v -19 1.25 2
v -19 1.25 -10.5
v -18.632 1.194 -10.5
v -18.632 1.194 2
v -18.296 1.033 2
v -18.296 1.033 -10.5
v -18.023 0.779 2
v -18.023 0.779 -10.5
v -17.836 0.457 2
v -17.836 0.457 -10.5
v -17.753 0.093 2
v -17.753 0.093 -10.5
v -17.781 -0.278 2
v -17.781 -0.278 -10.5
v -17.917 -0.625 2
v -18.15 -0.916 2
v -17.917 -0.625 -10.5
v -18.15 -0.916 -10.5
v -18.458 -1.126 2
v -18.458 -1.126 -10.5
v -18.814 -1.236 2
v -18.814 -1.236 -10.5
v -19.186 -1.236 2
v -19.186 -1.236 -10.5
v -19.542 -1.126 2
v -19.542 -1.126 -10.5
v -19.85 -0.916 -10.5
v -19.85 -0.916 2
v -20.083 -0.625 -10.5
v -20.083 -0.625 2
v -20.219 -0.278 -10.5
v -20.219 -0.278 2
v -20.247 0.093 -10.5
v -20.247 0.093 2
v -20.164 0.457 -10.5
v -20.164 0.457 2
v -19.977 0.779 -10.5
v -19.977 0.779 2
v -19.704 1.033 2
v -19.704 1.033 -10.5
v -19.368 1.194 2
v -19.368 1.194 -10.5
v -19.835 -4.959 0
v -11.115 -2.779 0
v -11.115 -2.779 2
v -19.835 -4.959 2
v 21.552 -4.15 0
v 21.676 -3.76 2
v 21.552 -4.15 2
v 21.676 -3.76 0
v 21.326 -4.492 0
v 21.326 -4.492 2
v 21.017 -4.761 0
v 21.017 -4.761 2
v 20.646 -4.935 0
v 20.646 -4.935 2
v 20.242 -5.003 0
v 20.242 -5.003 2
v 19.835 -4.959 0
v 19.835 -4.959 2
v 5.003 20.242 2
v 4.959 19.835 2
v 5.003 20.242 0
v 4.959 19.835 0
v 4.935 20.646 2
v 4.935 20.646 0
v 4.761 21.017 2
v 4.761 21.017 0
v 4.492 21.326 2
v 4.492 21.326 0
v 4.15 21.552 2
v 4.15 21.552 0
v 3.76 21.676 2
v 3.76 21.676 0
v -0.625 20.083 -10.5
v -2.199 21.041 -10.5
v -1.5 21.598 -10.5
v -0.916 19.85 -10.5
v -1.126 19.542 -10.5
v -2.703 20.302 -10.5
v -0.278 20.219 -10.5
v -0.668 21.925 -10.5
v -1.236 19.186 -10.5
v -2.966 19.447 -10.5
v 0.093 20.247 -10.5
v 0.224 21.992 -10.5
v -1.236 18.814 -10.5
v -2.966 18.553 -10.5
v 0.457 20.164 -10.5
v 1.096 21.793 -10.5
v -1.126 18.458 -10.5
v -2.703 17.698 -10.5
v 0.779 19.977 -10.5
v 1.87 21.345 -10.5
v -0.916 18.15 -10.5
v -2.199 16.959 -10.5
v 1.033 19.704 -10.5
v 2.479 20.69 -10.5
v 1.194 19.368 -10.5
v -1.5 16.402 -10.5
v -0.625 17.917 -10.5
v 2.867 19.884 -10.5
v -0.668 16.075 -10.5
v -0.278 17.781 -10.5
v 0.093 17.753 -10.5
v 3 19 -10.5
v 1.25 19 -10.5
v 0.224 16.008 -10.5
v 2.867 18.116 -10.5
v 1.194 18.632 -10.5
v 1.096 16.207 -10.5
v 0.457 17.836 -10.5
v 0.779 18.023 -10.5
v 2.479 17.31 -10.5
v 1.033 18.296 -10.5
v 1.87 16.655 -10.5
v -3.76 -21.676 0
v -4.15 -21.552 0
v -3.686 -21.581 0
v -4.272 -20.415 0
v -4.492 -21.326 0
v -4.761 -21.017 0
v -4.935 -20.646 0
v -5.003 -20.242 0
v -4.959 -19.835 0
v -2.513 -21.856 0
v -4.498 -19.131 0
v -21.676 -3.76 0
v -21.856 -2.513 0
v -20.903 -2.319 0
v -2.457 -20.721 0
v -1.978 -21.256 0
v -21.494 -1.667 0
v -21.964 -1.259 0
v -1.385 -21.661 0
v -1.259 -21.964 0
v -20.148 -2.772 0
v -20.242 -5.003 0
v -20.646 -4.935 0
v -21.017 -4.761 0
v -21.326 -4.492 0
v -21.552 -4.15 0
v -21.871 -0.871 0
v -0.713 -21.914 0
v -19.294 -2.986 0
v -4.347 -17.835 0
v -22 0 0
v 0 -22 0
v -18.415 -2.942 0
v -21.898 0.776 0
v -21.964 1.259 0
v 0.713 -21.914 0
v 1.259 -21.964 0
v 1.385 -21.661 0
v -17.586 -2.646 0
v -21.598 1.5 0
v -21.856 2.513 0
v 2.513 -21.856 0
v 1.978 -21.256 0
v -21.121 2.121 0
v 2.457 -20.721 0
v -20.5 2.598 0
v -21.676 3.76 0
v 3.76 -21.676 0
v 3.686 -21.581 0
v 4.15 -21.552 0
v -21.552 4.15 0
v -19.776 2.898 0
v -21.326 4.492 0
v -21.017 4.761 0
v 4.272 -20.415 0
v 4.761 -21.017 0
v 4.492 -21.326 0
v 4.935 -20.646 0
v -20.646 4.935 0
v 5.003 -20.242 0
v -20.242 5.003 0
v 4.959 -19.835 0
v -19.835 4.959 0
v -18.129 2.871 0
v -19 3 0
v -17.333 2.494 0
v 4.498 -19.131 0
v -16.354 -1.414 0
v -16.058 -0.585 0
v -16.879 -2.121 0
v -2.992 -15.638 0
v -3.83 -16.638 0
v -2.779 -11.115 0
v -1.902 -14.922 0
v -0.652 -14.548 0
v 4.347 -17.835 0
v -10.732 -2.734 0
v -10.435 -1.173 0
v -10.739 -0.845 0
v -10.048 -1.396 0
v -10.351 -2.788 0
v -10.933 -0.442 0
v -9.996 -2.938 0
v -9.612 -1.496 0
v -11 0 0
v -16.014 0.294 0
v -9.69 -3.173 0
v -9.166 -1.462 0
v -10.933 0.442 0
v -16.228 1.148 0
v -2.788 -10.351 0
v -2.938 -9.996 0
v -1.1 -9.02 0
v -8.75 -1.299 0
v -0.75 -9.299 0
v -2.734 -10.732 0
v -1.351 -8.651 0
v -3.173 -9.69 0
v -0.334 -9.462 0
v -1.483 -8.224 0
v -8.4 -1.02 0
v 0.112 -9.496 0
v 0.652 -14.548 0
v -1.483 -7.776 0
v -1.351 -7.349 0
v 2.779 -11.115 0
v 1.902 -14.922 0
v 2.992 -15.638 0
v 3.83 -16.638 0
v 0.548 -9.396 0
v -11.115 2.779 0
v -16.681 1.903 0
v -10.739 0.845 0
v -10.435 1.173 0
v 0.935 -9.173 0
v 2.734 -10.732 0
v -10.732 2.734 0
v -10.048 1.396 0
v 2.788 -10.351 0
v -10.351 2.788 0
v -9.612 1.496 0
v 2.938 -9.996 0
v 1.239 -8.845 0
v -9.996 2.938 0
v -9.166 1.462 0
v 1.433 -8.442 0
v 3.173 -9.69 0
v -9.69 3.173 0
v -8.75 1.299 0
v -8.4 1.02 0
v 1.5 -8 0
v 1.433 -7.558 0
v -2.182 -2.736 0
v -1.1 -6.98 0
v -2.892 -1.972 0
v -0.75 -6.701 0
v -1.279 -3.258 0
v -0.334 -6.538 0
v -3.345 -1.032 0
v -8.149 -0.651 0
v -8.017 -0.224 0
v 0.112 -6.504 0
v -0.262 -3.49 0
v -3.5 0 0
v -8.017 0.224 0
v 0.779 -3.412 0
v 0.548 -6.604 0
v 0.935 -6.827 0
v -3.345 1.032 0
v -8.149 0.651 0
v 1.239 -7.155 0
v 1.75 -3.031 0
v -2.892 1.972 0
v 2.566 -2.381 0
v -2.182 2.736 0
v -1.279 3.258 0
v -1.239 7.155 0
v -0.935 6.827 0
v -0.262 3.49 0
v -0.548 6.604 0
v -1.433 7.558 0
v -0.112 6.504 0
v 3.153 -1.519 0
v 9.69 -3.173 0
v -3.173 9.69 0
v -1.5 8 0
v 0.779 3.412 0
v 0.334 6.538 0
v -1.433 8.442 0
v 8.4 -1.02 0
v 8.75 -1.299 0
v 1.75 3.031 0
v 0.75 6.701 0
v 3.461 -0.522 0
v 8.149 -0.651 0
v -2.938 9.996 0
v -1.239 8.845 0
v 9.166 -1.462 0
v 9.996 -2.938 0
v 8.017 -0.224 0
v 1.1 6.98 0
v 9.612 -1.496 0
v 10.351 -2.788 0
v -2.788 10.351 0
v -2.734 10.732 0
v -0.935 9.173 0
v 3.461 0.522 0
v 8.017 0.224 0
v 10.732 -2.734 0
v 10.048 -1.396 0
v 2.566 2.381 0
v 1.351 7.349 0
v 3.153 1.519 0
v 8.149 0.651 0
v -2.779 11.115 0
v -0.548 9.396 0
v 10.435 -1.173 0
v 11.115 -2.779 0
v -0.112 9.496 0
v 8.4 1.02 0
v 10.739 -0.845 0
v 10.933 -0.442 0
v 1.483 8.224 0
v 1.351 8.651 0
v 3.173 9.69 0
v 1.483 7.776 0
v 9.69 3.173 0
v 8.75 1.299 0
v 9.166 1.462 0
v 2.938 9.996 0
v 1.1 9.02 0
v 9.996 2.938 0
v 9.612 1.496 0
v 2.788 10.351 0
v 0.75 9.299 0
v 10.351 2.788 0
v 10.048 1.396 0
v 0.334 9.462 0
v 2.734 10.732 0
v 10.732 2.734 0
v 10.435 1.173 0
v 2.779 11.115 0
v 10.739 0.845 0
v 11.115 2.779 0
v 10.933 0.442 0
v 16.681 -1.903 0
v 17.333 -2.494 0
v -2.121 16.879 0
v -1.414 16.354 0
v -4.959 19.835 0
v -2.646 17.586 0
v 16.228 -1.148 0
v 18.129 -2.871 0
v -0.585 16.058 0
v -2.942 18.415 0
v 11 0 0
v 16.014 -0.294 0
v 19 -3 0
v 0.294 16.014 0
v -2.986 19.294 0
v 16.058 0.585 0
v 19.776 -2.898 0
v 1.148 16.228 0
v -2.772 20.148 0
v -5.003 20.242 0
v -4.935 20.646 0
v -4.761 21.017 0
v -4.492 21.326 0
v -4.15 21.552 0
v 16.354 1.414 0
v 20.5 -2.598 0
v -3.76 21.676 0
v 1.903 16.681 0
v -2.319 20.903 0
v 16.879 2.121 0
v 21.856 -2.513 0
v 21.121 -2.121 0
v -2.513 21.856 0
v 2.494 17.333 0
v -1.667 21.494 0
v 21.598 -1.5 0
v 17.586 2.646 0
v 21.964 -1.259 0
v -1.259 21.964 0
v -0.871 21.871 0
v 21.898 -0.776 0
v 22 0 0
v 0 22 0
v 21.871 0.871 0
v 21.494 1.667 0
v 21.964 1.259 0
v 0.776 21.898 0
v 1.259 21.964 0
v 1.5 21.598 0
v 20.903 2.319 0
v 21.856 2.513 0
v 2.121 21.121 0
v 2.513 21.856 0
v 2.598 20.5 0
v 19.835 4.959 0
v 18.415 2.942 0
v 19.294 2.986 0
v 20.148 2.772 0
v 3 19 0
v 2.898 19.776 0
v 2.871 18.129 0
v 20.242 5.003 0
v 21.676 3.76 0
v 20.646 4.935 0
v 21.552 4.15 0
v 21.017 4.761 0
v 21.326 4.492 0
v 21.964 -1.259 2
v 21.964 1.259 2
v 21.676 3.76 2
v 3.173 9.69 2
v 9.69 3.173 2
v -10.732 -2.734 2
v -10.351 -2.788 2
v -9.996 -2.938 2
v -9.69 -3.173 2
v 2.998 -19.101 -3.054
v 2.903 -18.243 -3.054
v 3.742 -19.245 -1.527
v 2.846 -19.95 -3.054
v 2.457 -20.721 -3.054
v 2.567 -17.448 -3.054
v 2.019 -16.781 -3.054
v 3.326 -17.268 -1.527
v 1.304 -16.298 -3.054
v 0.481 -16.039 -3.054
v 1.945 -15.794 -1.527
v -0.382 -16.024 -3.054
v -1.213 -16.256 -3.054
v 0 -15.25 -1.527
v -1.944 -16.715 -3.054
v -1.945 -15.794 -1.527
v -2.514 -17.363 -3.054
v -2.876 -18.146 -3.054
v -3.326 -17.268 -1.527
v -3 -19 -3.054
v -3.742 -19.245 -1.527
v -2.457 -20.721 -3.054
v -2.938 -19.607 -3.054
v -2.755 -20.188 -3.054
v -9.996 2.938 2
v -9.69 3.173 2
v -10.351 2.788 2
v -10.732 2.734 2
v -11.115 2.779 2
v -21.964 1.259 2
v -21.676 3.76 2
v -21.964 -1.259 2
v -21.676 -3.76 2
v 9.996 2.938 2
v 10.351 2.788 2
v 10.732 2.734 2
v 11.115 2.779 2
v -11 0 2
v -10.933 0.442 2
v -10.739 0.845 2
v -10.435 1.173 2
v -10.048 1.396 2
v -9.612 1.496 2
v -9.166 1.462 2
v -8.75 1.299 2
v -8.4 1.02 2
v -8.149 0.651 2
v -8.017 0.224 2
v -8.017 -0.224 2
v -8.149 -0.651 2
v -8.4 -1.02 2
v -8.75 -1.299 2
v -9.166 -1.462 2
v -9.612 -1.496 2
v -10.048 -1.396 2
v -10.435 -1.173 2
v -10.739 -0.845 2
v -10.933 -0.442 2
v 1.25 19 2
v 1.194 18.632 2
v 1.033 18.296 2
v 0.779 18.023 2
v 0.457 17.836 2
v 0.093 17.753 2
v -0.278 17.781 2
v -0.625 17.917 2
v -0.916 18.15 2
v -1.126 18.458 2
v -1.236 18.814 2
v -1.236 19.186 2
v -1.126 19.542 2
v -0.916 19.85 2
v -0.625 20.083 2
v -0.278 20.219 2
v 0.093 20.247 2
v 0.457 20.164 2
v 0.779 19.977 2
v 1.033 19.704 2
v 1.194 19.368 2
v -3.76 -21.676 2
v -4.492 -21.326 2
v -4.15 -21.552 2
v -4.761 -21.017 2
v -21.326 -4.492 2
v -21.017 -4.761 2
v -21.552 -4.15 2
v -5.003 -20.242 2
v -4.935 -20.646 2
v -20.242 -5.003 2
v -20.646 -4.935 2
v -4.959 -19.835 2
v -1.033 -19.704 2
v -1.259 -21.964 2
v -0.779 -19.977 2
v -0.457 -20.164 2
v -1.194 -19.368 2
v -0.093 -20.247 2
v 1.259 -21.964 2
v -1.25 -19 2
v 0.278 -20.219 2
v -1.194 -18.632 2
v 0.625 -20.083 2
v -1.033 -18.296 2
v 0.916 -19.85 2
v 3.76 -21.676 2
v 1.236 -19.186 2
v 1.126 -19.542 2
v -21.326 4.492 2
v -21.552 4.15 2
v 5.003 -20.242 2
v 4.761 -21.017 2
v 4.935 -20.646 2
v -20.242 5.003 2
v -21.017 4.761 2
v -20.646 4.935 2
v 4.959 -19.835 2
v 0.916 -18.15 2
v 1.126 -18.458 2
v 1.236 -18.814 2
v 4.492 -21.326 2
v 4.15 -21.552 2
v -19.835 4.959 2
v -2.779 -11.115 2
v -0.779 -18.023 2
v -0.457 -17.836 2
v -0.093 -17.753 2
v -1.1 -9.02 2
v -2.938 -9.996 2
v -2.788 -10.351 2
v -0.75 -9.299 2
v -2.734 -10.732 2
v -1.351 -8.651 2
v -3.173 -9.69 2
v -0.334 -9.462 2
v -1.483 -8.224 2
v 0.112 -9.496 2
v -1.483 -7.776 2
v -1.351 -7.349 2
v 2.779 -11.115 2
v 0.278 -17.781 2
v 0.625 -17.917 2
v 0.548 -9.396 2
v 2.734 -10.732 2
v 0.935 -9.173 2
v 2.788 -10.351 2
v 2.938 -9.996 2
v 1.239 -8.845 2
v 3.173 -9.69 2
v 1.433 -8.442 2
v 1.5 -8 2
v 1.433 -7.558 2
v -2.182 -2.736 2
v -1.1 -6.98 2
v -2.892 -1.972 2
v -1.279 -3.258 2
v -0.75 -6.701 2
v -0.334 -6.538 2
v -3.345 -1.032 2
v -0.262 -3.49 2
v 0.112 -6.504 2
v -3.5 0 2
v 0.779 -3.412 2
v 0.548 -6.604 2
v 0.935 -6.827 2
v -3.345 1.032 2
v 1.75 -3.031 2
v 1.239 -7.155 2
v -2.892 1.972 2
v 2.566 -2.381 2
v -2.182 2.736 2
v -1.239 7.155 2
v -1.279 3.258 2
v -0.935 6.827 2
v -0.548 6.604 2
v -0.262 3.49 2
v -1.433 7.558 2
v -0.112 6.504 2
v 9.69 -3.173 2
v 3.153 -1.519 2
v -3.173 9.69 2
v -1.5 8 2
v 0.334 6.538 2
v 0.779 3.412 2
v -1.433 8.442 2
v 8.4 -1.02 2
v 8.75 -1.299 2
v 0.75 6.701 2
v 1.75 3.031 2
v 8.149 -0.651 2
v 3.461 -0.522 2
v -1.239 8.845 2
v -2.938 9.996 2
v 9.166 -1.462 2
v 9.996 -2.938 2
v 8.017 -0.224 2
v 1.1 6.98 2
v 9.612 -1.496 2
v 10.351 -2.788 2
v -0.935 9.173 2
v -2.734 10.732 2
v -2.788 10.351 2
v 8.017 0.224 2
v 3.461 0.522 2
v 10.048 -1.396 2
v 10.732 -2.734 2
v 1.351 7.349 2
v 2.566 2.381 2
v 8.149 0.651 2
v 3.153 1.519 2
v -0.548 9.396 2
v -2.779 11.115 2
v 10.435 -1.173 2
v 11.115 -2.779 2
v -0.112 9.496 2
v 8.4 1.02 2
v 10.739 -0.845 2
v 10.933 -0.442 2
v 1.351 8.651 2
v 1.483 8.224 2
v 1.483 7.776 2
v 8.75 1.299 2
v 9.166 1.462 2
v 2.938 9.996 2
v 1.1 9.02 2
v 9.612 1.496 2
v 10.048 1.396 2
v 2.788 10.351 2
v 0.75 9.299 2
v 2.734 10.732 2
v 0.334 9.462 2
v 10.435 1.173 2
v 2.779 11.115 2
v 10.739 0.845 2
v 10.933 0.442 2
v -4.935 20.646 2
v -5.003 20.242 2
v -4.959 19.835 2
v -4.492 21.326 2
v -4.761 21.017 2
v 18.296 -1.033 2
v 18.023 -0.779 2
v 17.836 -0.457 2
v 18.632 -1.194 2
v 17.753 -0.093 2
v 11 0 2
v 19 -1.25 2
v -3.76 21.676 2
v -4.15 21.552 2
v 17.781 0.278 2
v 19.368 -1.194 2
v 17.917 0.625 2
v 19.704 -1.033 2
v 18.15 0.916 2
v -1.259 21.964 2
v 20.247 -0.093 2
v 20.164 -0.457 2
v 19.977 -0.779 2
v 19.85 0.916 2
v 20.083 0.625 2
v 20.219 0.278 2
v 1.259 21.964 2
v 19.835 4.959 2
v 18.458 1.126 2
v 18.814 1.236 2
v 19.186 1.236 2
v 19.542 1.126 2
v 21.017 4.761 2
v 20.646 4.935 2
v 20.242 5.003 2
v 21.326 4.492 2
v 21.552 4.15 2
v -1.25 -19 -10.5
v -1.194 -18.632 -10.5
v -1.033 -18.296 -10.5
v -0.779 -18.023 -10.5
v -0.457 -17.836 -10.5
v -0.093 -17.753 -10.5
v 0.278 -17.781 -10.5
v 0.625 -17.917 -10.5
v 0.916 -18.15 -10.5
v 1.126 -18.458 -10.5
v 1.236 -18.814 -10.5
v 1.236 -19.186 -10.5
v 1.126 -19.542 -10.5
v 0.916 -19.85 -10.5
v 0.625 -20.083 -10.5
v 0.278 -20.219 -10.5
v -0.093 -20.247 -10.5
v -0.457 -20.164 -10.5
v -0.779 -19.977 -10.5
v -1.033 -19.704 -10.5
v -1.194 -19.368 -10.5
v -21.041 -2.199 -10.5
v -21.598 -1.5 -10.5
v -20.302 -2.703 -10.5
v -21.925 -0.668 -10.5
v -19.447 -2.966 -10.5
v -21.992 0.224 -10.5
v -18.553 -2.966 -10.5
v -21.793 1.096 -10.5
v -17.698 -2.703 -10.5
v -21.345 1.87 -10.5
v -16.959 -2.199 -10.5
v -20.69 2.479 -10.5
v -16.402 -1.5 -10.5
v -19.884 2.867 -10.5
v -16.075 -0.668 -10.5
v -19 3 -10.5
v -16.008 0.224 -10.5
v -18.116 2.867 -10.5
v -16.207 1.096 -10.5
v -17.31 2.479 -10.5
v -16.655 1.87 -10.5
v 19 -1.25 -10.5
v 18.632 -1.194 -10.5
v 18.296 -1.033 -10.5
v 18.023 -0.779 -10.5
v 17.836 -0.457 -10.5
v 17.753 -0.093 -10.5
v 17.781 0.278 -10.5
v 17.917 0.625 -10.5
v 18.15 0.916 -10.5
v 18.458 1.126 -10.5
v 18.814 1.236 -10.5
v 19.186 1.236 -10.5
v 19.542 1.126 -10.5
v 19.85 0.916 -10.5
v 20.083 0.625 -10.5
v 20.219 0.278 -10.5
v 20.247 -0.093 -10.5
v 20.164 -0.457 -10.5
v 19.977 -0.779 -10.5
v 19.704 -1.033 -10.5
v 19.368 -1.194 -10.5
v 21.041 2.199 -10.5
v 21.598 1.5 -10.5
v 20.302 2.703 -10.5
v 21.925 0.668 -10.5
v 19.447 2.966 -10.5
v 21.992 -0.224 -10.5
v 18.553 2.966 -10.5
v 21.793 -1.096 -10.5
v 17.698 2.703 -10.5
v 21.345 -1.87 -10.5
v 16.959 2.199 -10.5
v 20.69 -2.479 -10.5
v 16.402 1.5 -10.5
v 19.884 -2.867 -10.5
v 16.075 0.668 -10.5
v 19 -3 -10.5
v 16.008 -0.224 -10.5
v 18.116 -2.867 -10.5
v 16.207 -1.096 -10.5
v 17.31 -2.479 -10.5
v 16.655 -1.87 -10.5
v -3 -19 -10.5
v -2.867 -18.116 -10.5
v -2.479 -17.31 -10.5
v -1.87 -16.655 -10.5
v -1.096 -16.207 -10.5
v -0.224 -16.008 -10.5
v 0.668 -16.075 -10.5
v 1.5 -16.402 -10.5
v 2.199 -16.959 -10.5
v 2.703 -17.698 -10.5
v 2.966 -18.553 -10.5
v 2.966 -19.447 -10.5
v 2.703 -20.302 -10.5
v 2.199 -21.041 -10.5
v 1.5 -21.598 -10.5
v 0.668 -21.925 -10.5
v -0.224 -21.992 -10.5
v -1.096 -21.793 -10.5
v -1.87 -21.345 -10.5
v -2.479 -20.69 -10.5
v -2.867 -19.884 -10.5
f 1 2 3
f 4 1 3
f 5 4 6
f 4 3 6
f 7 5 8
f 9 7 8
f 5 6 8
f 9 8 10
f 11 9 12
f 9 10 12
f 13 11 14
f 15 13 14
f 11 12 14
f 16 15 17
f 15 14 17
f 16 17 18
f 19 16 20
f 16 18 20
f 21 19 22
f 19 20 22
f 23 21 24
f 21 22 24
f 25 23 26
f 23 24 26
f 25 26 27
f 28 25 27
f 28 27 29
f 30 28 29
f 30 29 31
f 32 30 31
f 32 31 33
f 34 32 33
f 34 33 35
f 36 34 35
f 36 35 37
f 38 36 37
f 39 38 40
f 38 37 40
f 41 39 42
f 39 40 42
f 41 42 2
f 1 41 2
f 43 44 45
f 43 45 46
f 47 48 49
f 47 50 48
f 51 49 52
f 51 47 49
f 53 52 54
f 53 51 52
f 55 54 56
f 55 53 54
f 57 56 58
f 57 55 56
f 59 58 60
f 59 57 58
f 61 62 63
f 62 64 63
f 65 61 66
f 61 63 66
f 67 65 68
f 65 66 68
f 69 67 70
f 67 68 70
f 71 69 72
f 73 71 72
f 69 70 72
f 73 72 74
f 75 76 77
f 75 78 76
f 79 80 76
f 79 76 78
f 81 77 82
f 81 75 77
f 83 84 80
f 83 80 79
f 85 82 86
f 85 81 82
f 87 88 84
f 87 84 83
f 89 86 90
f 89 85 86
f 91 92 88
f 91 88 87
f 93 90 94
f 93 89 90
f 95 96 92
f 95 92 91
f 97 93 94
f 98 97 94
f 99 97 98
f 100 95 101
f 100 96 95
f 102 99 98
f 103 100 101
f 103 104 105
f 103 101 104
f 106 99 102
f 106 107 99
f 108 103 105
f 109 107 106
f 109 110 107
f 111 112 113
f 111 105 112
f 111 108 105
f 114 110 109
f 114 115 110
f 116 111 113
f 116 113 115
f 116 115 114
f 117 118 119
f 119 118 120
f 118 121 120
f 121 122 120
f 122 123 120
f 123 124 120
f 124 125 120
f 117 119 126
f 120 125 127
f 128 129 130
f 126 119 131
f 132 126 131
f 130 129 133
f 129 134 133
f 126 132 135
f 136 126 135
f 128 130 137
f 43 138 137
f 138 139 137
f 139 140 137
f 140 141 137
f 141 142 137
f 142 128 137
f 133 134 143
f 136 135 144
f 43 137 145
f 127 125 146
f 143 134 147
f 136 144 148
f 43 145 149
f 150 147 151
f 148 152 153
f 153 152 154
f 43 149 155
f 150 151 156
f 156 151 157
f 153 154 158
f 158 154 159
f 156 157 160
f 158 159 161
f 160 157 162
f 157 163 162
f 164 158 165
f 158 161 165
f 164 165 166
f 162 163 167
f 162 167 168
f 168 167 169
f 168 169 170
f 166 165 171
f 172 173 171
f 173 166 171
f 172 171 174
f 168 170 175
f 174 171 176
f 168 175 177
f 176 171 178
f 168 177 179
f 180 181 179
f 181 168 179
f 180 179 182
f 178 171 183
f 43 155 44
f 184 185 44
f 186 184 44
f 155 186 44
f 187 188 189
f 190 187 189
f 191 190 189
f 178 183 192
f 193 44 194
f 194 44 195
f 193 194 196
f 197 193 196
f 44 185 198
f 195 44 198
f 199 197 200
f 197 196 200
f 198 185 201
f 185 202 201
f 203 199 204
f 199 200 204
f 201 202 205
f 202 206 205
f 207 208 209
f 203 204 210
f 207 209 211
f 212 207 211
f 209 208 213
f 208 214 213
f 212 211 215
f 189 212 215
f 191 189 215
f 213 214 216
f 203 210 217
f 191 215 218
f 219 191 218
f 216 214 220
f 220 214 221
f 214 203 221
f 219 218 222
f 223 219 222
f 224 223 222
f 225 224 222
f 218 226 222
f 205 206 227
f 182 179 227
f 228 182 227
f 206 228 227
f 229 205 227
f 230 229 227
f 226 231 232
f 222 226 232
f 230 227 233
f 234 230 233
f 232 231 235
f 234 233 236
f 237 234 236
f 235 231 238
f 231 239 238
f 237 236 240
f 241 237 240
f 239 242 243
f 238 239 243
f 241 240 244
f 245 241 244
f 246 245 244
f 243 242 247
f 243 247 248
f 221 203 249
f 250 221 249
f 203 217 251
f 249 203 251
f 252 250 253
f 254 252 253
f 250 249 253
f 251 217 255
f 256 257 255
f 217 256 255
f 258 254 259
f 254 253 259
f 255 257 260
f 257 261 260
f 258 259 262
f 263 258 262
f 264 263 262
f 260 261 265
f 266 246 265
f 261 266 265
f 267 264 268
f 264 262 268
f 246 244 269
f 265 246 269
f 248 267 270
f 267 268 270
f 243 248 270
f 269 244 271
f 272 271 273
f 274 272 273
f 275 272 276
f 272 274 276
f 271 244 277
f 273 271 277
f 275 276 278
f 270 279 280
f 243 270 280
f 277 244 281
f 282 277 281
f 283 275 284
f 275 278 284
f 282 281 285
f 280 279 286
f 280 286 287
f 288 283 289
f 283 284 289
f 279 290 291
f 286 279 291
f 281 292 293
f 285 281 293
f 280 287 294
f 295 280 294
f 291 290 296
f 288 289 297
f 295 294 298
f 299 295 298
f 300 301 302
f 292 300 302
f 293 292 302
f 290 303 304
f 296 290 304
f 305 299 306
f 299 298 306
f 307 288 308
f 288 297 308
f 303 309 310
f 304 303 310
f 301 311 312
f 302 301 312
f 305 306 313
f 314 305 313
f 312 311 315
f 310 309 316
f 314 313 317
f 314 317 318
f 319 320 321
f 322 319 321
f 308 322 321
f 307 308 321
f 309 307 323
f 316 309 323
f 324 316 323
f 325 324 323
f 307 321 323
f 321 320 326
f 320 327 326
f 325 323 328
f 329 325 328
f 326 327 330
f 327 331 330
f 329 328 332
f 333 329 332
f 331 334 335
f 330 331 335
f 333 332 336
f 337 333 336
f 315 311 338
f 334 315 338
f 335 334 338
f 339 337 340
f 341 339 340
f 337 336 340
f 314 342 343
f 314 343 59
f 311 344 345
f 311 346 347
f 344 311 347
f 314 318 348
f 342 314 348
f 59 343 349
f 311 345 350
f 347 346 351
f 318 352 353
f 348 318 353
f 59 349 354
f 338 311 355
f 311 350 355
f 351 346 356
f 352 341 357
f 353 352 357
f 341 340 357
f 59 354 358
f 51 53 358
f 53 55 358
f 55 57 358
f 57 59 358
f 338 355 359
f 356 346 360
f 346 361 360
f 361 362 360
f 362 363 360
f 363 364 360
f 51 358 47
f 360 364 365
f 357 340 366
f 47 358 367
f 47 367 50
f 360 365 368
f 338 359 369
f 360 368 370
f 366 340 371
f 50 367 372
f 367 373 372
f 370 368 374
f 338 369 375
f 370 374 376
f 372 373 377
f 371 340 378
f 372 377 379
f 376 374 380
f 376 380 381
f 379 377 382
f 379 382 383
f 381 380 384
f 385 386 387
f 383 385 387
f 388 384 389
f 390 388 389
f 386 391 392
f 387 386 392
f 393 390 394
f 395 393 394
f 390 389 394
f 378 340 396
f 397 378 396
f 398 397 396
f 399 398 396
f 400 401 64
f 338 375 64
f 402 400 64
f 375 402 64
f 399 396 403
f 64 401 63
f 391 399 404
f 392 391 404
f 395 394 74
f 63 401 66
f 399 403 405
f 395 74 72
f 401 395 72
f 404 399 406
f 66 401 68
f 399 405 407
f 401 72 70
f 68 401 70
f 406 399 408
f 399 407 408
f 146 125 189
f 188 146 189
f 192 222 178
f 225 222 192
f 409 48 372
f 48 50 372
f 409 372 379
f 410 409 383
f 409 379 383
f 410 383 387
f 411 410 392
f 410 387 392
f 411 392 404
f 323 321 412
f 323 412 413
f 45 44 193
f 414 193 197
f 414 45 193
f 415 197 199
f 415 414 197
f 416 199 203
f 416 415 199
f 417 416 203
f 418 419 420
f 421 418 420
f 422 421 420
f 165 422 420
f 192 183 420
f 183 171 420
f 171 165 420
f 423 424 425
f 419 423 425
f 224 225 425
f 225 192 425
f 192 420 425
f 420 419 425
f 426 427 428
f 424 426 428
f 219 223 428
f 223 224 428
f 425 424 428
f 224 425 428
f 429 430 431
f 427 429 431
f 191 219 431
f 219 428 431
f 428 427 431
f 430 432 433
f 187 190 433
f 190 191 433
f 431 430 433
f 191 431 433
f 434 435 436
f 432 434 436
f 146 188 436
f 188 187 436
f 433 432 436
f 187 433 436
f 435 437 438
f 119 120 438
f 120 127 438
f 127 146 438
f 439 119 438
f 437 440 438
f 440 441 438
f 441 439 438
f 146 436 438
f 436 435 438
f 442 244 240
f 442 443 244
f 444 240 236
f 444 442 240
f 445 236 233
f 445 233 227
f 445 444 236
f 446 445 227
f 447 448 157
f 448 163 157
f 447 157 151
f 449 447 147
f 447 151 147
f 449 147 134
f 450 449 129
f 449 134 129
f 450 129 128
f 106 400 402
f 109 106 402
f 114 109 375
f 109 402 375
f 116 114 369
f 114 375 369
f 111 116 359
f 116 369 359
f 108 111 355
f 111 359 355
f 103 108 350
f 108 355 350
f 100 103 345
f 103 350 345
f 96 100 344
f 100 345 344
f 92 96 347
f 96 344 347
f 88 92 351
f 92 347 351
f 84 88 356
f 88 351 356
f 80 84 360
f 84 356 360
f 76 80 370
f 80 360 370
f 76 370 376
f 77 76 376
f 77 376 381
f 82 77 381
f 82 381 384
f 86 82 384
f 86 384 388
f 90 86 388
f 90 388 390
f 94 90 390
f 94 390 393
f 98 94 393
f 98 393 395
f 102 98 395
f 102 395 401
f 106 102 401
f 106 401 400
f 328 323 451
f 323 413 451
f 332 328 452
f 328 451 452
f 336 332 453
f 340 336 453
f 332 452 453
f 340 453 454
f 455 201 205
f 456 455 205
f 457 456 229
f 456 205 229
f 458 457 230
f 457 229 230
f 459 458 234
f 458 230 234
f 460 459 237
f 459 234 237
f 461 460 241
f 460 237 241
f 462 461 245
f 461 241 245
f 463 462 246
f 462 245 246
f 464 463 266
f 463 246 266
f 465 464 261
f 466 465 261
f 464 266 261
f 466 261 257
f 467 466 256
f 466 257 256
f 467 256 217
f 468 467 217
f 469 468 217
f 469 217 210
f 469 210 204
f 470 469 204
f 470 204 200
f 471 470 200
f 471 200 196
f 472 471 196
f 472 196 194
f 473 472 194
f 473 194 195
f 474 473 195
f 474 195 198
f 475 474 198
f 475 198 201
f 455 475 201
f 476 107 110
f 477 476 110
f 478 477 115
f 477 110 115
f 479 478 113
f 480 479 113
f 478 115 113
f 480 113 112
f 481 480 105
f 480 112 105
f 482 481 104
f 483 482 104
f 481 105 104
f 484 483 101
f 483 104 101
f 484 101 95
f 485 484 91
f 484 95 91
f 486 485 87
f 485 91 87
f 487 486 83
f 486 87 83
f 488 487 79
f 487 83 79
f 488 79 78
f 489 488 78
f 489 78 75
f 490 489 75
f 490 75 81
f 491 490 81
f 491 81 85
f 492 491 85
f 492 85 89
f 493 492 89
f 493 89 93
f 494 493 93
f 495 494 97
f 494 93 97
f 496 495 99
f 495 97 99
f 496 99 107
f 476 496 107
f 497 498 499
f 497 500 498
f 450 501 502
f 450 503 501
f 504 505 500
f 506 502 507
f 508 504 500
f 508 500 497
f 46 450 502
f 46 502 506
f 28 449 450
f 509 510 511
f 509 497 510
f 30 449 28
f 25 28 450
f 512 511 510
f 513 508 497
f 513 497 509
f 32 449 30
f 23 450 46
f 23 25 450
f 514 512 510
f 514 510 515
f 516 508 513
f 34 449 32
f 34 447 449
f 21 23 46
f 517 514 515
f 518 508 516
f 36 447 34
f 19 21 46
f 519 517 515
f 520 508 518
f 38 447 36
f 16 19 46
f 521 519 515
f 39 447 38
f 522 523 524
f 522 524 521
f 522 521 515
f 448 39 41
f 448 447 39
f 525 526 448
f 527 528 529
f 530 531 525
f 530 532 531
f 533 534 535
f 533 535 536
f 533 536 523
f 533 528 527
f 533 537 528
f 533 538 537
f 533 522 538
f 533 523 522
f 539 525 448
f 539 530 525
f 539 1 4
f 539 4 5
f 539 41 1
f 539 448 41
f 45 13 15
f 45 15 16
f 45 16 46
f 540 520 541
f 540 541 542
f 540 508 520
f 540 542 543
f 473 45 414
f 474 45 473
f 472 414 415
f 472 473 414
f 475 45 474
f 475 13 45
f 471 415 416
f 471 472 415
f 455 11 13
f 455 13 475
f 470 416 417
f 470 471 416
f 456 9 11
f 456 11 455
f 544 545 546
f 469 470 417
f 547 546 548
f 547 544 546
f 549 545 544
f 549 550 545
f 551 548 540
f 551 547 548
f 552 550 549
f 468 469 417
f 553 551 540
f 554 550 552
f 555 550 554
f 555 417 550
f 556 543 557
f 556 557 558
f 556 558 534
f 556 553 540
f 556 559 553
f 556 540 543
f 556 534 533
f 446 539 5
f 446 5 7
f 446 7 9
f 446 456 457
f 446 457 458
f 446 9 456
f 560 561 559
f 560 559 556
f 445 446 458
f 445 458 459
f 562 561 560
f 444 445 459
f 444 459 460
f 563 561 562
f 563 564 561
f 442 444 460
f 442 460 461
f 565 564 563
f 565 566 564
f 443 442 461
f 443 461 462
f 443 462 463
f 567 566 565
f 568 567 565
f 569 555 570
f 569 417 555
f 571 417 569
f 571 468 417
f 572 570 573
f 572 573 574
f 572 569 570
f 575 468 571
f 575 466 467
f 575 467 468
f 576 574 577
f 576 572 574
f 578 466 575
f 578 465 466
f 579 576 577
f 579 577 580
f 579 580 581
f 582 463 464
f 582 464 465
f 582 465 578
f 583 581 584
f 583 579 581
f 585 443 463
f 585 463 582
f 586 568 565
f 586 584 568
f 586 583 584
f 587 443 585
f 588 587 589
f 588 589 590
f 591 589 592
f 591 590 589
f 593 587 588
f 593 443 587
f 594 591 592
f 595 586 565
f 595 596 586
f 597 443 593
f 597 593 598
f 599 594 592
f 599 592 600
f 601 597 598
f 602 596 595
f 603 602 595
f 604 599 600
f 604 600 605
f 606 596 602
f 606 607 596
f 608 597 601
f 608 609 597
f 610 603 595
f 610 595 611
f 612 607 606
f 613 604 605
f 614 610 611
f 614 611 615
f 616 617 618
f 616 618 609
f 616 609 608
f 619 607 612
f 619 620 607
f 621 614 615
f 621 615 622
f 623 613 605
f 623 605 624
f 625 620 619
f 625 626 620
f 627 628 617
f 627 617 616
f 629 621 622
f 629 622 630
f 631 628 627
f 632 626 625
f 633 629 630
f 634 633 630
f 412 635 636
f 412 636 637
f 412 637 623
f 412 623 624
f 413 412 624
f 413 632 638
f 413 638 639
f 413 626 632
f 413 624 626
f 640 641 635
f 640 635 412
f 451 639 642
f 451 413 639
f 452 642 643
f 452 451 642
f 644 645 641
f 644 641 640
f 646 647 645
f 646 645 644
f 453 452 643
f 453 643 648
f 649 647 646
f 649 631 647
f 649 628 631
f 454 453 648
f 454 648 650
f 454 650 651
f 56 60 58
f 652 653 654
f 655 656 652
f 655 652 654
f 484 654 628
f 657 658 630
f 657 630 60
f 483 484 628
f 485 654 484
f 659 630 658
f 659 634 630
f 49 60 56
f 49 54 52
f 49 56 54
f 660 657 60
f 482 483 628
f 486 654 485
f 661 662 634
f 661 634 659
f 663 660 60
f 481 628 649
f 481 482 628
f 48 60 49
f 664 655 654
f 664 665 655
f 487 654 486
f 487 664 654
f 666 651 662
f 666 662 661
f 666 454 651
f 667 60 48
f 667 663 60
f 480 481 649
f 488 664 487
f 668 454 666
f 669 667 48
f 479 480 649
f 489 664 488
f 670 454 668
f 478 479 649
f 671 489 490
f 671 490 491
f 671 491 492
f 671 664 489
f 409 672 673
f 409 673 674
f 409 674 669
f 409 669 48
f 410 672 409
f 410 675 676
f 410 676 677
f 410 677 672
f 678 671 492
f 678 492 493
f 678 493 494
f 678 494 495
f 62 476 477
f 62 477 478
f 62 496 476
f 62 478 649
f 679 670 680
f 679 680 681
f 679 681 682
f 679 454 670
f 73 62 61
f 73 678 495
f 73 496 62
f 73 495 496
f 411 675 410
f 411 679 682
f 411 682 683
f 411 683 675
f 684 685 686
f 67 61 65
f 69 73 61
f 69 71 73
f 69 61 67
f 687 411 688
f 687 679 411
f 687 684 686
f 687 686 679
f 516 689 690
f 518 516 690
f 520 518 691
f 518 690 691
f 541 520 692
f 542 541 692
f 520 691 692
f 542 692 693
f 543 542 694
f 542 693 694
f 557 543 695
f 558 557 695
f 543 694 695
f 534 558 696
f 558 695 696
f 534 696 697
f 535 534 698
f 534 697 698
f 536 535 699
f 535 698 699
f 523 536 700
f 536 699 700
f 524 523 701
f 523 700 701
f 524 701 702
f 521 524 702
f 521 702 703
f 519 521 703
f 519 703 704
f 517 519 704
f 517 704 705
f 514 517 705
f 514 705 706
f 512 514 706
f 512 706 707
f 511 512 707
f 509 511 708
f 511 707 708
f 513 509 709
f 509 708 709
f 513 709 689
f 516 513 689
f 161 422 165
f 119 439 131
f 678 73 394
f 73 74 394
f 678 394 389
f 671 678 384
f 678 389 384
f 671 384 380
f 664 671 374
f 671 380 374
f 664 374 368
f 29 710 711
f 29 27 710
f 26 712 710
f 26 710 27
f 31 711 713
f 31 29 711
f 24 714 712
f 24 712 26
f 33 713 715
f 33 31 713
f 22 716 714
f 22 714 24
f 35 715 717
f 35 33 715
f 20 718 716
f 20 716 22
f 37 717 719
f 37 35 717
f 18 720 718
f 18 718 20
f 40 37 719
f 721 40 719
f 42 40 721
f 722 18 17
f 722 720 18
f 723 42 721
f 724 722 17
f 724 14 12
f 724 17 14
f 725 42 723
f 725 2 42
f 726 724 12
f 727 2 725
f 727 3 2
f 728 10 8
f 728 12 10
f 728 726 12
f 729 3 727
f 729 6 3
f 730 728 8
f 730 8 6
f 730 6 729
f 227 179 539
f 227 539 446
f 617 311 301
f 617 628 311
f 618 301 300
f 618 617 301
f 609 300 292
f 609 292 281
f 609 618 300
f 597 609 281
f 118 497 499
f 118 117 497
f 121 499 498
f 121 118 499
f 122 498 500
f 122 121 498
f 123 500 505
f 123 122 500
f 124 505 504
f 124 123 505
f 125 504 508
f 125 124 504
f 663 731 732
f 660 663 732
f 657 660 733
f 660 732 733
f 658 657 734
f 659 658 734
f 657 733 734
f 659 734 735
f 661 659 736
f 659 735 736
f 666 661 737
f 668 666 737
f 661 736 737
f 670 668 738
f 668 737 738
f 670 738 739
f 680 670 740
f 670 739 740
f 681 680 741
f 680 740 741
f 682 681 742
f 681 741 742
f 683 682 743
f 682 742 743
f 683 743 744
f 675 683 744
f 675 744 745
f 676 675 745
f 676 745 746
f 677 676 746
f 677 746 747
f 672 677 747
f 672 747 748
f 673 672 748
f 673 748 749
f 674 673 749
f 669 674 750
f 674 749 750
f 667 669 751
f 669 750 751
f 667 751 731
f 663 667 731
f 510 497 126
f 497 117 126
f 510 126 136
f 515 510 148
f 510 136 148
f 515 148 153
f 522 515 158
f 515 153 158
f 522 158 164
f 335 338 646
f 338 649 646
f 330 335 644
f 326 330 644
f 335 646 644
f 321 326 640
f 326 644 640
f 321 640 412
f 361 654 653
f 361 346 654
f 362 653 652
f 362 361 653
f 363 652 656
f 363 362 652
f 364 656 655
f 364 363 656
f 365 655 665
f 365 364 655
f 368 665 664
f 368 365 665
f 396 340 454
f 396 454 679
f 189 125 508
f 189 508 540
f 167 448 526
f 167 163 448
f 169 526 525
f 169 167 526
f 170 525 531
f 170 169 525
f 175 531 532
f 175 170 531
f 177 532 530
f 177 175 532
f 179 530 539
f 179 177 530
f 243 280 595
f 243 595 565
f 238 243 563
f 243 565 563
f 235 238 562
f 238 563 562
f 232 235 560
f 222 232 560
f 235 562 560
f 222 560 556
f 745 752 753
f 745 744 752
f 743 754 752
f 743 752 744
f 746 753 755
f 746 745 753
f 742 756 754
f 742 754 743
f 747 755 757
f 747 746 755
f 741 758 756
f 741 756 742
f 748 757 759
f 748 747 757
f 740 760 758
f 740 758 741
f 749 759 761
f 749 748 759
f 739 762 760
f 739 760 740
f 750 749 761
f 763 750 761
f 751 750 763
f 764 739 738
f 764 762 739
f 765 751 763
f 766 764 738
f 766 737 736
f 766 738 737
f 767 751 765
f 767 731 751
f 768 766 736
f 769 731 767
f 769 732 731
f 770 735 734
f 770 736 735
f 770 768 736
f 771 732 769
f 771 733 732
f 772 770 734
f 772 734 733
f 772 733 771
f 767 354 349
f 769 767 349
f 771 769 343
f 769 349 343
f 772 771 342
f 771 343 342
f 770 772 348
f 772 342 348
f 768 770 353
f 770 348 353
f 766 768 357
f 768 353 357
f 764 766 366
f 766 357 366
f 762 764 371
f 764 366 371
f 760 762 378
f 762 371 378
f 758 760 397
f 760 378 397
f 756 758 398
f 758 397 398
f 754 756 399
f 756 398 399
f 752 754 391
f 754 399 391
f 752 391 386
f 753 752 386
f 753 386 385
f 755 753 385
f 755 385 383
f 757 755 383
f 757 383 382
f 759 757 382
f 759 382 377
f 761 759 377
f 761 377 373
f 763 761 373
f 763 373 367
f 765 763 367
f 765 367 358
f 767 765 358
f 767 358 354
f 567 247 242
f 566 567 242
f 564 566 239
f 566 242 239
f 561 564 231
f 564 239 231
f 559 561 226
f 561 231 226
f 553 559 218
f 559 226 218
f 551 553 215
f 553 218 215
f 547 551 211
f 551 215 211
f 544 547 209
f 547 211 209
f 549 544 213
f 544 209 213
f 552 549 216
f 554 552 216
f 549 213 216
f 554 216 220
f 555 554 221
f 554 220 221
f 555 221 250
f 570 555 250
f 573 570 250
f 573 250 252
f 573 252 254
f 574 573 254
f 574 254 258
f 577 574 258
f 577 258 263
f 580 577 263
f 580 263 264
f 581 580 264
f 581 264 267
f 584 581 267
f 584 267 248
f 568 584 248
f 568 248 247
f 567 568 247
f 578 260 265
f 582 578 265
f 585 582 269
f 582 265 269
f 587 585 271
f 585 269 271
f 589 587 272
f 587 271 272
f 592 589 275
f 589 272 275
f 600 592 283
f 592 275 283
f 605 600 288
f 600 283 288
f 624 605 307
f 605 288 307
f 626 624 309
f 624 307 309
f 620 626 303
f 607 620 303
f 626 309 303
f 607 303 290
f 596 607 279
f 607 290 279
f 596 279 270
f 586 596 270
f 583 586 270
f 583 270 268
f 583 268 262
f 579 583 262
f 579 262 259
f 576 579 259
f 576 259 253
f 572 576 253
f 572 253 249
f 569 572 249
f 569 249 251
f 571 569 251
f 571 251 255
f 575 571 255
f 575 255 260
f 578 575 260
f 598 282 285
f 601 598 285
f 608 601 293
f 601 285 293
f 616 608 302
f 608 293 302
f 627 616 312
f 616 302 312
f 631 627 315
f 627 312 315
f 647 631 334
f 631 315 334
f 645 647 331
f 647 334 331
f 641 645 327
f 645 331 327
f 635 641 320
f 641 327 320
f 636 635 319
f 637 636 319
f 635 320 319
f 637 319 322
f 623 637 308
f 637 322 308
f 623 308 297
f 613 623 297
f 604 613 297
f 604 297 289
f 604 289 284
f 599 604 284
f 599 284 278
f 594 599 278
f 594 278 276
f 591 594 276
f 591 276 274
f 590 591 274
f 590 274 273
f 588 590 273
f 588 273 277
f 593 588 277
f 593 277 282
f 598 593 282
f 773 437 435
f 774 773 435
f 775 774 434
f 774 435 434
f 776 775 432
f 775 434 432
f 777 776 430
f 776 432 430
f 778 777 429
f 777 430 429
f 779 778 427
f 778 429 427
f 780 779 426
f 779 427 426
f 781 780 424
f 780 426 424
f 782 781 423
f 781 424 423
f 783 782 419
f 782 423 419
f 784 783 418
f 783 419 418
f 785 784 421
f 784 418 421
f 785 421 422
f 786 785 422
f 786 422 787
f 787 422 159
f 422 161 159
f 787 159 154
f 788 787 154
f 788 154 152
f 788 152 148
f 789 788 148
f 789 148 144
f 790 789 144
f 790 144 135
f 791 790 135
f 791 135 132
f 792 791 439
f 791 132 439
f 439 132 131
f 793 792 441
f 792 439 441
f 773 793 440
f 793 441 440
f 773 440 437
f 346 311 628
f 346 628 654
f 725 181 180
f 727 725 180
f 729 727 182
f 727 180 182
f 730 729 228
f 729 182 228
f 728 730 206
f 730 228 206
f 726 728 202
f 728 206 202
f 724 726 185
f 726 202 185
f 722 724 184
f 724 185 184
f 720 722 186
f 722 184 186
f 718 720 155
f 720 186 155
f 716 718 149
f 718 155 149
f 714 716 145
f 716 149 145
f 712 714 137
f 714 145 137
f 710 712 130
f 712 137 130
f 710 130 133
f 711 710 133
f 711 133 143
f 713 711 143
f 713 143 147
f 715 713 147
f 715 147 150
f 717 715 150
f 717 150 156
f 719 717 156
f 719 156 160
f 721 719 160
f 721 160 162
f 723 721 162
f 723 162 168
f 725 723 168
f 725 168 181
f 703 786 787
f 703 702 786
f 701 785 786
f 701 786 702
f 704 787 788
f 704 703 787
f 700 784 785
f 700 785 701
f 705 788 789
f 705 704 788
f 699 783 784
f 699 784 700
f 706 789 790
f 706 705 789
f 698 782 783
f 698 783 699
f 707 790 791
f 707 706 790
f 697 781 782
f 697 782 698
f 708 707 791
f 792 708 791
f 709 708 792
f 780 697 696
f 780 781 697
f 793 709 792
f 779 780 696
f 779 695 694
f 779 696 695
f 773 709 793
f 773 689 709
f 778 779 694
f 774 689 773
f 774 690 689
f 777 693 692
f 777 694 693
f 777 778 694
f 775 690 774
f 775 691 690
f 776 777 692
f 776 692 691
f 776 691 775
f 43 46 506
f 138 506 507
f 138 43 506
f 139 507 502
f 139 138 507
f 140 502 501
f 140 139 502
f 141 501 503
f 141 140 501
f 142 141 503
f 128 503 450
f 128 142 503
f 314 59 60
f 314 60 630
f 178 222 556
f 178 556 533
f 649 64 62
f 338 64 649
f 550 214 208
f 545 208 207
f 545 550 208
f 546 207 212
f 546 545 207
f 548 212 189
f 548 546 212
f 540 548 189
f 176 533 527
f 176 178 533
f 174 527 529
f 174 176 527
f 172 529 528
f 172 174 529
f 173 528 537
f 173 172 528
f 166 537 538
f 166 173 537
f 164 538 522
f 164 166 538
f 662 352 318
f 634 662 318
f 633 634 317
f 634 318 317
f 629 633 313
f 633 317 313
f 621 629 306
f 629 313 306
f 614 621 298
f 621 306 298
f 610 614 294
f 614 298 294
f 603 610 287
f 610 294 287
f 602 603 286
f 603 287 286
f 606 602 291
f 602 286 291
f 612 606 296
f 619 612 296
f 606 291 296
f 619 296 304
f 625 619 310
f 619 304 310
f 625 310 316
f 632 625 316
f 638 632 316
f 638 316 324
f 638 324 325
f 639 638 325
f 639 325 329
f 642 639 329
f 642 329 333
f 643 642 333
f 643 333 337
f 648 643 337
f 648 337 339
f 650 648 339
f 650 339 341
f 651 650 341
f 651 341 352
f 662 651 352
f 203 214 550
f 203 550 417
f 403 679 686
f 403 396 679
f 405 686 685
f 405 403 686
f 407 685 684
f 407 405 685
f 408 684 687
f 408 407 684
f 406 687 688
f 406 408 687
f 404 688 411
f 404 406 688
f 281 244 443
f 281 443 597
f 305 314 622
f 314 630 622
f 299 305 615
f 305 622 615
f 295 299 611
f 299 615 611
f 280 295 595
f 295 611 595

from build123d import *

# Parameters (mm, degrees)
SKETCH_1_R                = 22
EXTRUDE_1_DEPTH           = 2
SKETCH_3_R                = 1.5
CUT_EXTRUDE_1_DEPTH       = 3
SKETCH_4_R                = 3.5
CUT_EXTRUDE_2_DEPTH       = 3
SKETCH_6_R                = 3
EXTRUDE_3_DEPTH           = 10.5
SKETCH_8_R                = 1.25
CUT_EXTRUDE_4_DEPTH       = 12.5
CUT_EXTRUDE_3_DEPTH       = 6
PATTERN_CIRCULAR_1_COUNT  = 4
FILLET_2_R                = 1.5
FILLET_3_R                = 1.5
PATTERN_CIRCULAR_2_COUNT  = 2
REVOLVE_1_ANGLE           = 125
REVOLVE_1_OTHER_WAY_ANGLE = 125


with BuildPart() as part:
    # 草图1 → 凸台-拉伸1 (new body)
    with BuildSketch(Plane.XY):
        Circle(SKETCH_1_R)
    extrude(amount=EXTRUDE_1_DEPTH)

    # 草图3 → 切除-拉伸1 (cut)
    with BuildSketch(Plane(origin=(0, 0, 0), x_dir=(-1, 0, 0), z_dir=(0, 0, -1))):
        with Locations((9.5, 0)):
            Circle(SKETCH_3_R)
        with Locations((0, 8)):
            Circle(SKETCH_3_R)
    cut_extrude_1 = extrude(amount=-CUT_EXTRUDE_1_DEPTH, mode=Mode.SUBTRACT)

    # 草图4 → 切除-拉伸2 (cut)
    with BuildSketch(Plane(origin=(0, 0, 0), x_dir=(-1, 0, 0), z_dir=(0, 0, -1))):
        Circle(SKETCH_4_R)
    extrude(amount=-CUT_EXTRUDE_2_DEPTH, mode=Mode.SUBTRACT)

    # 草图6 → 凸台-拉伸3 (add)
    with BuildSketch(Plane(origin=(0, 0, 0), x_dir=(-1, 0, 0), z_dir=(0, 0, -1))):
        with Locations((0, -19)):
            Circle(SKETCH_6_R)
    extrude_3 = extrude(amount=EXTRUDE_3_DEPTH)

    # 草图8 → 切除-拉伸4 (cut)
    with BuildSketch(Plane(origin=(0, 0, -10.5), x_dir=(-1, 0, 0), z_dir=(0, 0, -1))):
        with Locations((0, -19)):
            Circle(SKETCH_8_R)
    cut_extrude_4 = extrude(amount=-CUT_EXTRUDE_4_DEPTH, mode=Mode.SUBTRACT)

    # 草图7 → 切除-拉伸3 (cut)
    with BuildSketch(Plane(origin=(0, 0, 0), x_dir=(-1, 0, 0), z_dir=(0, 0, -1))):
        Polygon((-2.572740594, 10.290962376), (-10.290962376, 2.572740594), (-30.512752563, 7.628188141), (-7.628188141, 30.512752563), align=None)
    cut_extrude_3 = extrude(amount=-CUT_EXTRUDE_3_DEPTH, mode=Mode.SUBTRACT)

    # 阵列(圆周)1: 凸台-拉伸3, 切除-拉伸4, 切除-拉伸3 ×4 about axis
    pattern_circular_1_axis = Axis((0, 0, 0), (0, 0, 1))
    for i in range(1, PATTERN_CIRCULAR_1_COUNT):
        add(extrude_3.rotate(pattern_circular_1_axis, i * 360 / PATTERN_CIRCULAR_1_COUNT))
        add(cut_extrude_4.rotate(pattern_circular_1_axis, i * 360 / PATTERN_CIRCULAR_1_COUNT), mode=Mode.SUBTRACT)
        add(cut_extrude_3.rotate(pattern_circular_1_axis, i * 360 / PATTERN_CIRCULAR_1_COUNT), mode=Mode.SUBTRACT)

    # 圆角2
    fillet_2_edges = [part.edges().sort_by_distance(p)[0] for p in [
        (21.343135003, -5.335783751, 1),
        (5.335783751, -21.343135003, 1),
        (5.335783751, 21.343135003, 1),
        (21.343135003, 5.335783751, 1),
        (-21.343135003, 5.335783751, 1),
        (-5.335783751, 21.343135003, 1),
        (-5.335783751, -21.343135003, 1),
        (-21.343135003, -5.335783751, 1),
    ]]
    fillet(fillet_2_edges, radius=FILLET_2_R)

    # 圆角3
    fillet_3_edges = [part.edges().sort_by_distance(p)[0] for p in [
        (2.572740594, -10.290962376, 1),
        (10.290962376, -2.572740594, 1),
        (10.290962376, 2.572740594, 1),
        (2.572740594, 10.290962376, 1),
        (-2.572740594, 10.290962376, 1),
        (-10.290962376, 2.572740594, 1),
        (-10.290962376, -2.572740594, 1),
        (-2.572740594, -10.290962376, 1),
    ]]
    fillet(fillet_3_edges, radius=FILLET_3_R)

    # 阵列(圆周)2: 切除-拉伸1 ×2 about axis
    pattern_circular_2_axis = Axis((0, 0, 0), (0, 0, 1))
    for i in range(1, PATTERN_CIRCULAR_2_COUNT):
        add(cut_extrude_1.rotate(pattern_circular_2_axis, i * 360 / PATTERN_CIRCULAR_2_COUNT), mode=Mode.SUBTRACT)

    # 草图10 → 旋转1 (revolve)
    with BuildSketch(Plane(origin=(0, 0, 0), x_dir=(0, 0, -1), z_dir=(1, 0, 0))):
        Polygon((0, -16.312681485), (0, -14.5), (3.69057161, -16.312681485), align=None)
    revolve(axis=Axis((0, -19, 2), (0, 0, -1)), revolution_arc=REVOLVE_1_ANGLE)

    # 草图10 → 旋转1 other way (revolve)
    with BuildSketch(Plane(origin=(0, 0, 0), x_dir=(0, 0, -1), z_dir=(1, 0, 0))):
        Polygon((0, -16.312681485), (0, -14.5), (3.69057161, -16.312681485), align=None)
    revolve(axis=Axis((0, -19, 2), (0, 0, 1)), revolution_arc=REVOLVE_1_OTHER_WAY_ANGLE)


solid = part.part
